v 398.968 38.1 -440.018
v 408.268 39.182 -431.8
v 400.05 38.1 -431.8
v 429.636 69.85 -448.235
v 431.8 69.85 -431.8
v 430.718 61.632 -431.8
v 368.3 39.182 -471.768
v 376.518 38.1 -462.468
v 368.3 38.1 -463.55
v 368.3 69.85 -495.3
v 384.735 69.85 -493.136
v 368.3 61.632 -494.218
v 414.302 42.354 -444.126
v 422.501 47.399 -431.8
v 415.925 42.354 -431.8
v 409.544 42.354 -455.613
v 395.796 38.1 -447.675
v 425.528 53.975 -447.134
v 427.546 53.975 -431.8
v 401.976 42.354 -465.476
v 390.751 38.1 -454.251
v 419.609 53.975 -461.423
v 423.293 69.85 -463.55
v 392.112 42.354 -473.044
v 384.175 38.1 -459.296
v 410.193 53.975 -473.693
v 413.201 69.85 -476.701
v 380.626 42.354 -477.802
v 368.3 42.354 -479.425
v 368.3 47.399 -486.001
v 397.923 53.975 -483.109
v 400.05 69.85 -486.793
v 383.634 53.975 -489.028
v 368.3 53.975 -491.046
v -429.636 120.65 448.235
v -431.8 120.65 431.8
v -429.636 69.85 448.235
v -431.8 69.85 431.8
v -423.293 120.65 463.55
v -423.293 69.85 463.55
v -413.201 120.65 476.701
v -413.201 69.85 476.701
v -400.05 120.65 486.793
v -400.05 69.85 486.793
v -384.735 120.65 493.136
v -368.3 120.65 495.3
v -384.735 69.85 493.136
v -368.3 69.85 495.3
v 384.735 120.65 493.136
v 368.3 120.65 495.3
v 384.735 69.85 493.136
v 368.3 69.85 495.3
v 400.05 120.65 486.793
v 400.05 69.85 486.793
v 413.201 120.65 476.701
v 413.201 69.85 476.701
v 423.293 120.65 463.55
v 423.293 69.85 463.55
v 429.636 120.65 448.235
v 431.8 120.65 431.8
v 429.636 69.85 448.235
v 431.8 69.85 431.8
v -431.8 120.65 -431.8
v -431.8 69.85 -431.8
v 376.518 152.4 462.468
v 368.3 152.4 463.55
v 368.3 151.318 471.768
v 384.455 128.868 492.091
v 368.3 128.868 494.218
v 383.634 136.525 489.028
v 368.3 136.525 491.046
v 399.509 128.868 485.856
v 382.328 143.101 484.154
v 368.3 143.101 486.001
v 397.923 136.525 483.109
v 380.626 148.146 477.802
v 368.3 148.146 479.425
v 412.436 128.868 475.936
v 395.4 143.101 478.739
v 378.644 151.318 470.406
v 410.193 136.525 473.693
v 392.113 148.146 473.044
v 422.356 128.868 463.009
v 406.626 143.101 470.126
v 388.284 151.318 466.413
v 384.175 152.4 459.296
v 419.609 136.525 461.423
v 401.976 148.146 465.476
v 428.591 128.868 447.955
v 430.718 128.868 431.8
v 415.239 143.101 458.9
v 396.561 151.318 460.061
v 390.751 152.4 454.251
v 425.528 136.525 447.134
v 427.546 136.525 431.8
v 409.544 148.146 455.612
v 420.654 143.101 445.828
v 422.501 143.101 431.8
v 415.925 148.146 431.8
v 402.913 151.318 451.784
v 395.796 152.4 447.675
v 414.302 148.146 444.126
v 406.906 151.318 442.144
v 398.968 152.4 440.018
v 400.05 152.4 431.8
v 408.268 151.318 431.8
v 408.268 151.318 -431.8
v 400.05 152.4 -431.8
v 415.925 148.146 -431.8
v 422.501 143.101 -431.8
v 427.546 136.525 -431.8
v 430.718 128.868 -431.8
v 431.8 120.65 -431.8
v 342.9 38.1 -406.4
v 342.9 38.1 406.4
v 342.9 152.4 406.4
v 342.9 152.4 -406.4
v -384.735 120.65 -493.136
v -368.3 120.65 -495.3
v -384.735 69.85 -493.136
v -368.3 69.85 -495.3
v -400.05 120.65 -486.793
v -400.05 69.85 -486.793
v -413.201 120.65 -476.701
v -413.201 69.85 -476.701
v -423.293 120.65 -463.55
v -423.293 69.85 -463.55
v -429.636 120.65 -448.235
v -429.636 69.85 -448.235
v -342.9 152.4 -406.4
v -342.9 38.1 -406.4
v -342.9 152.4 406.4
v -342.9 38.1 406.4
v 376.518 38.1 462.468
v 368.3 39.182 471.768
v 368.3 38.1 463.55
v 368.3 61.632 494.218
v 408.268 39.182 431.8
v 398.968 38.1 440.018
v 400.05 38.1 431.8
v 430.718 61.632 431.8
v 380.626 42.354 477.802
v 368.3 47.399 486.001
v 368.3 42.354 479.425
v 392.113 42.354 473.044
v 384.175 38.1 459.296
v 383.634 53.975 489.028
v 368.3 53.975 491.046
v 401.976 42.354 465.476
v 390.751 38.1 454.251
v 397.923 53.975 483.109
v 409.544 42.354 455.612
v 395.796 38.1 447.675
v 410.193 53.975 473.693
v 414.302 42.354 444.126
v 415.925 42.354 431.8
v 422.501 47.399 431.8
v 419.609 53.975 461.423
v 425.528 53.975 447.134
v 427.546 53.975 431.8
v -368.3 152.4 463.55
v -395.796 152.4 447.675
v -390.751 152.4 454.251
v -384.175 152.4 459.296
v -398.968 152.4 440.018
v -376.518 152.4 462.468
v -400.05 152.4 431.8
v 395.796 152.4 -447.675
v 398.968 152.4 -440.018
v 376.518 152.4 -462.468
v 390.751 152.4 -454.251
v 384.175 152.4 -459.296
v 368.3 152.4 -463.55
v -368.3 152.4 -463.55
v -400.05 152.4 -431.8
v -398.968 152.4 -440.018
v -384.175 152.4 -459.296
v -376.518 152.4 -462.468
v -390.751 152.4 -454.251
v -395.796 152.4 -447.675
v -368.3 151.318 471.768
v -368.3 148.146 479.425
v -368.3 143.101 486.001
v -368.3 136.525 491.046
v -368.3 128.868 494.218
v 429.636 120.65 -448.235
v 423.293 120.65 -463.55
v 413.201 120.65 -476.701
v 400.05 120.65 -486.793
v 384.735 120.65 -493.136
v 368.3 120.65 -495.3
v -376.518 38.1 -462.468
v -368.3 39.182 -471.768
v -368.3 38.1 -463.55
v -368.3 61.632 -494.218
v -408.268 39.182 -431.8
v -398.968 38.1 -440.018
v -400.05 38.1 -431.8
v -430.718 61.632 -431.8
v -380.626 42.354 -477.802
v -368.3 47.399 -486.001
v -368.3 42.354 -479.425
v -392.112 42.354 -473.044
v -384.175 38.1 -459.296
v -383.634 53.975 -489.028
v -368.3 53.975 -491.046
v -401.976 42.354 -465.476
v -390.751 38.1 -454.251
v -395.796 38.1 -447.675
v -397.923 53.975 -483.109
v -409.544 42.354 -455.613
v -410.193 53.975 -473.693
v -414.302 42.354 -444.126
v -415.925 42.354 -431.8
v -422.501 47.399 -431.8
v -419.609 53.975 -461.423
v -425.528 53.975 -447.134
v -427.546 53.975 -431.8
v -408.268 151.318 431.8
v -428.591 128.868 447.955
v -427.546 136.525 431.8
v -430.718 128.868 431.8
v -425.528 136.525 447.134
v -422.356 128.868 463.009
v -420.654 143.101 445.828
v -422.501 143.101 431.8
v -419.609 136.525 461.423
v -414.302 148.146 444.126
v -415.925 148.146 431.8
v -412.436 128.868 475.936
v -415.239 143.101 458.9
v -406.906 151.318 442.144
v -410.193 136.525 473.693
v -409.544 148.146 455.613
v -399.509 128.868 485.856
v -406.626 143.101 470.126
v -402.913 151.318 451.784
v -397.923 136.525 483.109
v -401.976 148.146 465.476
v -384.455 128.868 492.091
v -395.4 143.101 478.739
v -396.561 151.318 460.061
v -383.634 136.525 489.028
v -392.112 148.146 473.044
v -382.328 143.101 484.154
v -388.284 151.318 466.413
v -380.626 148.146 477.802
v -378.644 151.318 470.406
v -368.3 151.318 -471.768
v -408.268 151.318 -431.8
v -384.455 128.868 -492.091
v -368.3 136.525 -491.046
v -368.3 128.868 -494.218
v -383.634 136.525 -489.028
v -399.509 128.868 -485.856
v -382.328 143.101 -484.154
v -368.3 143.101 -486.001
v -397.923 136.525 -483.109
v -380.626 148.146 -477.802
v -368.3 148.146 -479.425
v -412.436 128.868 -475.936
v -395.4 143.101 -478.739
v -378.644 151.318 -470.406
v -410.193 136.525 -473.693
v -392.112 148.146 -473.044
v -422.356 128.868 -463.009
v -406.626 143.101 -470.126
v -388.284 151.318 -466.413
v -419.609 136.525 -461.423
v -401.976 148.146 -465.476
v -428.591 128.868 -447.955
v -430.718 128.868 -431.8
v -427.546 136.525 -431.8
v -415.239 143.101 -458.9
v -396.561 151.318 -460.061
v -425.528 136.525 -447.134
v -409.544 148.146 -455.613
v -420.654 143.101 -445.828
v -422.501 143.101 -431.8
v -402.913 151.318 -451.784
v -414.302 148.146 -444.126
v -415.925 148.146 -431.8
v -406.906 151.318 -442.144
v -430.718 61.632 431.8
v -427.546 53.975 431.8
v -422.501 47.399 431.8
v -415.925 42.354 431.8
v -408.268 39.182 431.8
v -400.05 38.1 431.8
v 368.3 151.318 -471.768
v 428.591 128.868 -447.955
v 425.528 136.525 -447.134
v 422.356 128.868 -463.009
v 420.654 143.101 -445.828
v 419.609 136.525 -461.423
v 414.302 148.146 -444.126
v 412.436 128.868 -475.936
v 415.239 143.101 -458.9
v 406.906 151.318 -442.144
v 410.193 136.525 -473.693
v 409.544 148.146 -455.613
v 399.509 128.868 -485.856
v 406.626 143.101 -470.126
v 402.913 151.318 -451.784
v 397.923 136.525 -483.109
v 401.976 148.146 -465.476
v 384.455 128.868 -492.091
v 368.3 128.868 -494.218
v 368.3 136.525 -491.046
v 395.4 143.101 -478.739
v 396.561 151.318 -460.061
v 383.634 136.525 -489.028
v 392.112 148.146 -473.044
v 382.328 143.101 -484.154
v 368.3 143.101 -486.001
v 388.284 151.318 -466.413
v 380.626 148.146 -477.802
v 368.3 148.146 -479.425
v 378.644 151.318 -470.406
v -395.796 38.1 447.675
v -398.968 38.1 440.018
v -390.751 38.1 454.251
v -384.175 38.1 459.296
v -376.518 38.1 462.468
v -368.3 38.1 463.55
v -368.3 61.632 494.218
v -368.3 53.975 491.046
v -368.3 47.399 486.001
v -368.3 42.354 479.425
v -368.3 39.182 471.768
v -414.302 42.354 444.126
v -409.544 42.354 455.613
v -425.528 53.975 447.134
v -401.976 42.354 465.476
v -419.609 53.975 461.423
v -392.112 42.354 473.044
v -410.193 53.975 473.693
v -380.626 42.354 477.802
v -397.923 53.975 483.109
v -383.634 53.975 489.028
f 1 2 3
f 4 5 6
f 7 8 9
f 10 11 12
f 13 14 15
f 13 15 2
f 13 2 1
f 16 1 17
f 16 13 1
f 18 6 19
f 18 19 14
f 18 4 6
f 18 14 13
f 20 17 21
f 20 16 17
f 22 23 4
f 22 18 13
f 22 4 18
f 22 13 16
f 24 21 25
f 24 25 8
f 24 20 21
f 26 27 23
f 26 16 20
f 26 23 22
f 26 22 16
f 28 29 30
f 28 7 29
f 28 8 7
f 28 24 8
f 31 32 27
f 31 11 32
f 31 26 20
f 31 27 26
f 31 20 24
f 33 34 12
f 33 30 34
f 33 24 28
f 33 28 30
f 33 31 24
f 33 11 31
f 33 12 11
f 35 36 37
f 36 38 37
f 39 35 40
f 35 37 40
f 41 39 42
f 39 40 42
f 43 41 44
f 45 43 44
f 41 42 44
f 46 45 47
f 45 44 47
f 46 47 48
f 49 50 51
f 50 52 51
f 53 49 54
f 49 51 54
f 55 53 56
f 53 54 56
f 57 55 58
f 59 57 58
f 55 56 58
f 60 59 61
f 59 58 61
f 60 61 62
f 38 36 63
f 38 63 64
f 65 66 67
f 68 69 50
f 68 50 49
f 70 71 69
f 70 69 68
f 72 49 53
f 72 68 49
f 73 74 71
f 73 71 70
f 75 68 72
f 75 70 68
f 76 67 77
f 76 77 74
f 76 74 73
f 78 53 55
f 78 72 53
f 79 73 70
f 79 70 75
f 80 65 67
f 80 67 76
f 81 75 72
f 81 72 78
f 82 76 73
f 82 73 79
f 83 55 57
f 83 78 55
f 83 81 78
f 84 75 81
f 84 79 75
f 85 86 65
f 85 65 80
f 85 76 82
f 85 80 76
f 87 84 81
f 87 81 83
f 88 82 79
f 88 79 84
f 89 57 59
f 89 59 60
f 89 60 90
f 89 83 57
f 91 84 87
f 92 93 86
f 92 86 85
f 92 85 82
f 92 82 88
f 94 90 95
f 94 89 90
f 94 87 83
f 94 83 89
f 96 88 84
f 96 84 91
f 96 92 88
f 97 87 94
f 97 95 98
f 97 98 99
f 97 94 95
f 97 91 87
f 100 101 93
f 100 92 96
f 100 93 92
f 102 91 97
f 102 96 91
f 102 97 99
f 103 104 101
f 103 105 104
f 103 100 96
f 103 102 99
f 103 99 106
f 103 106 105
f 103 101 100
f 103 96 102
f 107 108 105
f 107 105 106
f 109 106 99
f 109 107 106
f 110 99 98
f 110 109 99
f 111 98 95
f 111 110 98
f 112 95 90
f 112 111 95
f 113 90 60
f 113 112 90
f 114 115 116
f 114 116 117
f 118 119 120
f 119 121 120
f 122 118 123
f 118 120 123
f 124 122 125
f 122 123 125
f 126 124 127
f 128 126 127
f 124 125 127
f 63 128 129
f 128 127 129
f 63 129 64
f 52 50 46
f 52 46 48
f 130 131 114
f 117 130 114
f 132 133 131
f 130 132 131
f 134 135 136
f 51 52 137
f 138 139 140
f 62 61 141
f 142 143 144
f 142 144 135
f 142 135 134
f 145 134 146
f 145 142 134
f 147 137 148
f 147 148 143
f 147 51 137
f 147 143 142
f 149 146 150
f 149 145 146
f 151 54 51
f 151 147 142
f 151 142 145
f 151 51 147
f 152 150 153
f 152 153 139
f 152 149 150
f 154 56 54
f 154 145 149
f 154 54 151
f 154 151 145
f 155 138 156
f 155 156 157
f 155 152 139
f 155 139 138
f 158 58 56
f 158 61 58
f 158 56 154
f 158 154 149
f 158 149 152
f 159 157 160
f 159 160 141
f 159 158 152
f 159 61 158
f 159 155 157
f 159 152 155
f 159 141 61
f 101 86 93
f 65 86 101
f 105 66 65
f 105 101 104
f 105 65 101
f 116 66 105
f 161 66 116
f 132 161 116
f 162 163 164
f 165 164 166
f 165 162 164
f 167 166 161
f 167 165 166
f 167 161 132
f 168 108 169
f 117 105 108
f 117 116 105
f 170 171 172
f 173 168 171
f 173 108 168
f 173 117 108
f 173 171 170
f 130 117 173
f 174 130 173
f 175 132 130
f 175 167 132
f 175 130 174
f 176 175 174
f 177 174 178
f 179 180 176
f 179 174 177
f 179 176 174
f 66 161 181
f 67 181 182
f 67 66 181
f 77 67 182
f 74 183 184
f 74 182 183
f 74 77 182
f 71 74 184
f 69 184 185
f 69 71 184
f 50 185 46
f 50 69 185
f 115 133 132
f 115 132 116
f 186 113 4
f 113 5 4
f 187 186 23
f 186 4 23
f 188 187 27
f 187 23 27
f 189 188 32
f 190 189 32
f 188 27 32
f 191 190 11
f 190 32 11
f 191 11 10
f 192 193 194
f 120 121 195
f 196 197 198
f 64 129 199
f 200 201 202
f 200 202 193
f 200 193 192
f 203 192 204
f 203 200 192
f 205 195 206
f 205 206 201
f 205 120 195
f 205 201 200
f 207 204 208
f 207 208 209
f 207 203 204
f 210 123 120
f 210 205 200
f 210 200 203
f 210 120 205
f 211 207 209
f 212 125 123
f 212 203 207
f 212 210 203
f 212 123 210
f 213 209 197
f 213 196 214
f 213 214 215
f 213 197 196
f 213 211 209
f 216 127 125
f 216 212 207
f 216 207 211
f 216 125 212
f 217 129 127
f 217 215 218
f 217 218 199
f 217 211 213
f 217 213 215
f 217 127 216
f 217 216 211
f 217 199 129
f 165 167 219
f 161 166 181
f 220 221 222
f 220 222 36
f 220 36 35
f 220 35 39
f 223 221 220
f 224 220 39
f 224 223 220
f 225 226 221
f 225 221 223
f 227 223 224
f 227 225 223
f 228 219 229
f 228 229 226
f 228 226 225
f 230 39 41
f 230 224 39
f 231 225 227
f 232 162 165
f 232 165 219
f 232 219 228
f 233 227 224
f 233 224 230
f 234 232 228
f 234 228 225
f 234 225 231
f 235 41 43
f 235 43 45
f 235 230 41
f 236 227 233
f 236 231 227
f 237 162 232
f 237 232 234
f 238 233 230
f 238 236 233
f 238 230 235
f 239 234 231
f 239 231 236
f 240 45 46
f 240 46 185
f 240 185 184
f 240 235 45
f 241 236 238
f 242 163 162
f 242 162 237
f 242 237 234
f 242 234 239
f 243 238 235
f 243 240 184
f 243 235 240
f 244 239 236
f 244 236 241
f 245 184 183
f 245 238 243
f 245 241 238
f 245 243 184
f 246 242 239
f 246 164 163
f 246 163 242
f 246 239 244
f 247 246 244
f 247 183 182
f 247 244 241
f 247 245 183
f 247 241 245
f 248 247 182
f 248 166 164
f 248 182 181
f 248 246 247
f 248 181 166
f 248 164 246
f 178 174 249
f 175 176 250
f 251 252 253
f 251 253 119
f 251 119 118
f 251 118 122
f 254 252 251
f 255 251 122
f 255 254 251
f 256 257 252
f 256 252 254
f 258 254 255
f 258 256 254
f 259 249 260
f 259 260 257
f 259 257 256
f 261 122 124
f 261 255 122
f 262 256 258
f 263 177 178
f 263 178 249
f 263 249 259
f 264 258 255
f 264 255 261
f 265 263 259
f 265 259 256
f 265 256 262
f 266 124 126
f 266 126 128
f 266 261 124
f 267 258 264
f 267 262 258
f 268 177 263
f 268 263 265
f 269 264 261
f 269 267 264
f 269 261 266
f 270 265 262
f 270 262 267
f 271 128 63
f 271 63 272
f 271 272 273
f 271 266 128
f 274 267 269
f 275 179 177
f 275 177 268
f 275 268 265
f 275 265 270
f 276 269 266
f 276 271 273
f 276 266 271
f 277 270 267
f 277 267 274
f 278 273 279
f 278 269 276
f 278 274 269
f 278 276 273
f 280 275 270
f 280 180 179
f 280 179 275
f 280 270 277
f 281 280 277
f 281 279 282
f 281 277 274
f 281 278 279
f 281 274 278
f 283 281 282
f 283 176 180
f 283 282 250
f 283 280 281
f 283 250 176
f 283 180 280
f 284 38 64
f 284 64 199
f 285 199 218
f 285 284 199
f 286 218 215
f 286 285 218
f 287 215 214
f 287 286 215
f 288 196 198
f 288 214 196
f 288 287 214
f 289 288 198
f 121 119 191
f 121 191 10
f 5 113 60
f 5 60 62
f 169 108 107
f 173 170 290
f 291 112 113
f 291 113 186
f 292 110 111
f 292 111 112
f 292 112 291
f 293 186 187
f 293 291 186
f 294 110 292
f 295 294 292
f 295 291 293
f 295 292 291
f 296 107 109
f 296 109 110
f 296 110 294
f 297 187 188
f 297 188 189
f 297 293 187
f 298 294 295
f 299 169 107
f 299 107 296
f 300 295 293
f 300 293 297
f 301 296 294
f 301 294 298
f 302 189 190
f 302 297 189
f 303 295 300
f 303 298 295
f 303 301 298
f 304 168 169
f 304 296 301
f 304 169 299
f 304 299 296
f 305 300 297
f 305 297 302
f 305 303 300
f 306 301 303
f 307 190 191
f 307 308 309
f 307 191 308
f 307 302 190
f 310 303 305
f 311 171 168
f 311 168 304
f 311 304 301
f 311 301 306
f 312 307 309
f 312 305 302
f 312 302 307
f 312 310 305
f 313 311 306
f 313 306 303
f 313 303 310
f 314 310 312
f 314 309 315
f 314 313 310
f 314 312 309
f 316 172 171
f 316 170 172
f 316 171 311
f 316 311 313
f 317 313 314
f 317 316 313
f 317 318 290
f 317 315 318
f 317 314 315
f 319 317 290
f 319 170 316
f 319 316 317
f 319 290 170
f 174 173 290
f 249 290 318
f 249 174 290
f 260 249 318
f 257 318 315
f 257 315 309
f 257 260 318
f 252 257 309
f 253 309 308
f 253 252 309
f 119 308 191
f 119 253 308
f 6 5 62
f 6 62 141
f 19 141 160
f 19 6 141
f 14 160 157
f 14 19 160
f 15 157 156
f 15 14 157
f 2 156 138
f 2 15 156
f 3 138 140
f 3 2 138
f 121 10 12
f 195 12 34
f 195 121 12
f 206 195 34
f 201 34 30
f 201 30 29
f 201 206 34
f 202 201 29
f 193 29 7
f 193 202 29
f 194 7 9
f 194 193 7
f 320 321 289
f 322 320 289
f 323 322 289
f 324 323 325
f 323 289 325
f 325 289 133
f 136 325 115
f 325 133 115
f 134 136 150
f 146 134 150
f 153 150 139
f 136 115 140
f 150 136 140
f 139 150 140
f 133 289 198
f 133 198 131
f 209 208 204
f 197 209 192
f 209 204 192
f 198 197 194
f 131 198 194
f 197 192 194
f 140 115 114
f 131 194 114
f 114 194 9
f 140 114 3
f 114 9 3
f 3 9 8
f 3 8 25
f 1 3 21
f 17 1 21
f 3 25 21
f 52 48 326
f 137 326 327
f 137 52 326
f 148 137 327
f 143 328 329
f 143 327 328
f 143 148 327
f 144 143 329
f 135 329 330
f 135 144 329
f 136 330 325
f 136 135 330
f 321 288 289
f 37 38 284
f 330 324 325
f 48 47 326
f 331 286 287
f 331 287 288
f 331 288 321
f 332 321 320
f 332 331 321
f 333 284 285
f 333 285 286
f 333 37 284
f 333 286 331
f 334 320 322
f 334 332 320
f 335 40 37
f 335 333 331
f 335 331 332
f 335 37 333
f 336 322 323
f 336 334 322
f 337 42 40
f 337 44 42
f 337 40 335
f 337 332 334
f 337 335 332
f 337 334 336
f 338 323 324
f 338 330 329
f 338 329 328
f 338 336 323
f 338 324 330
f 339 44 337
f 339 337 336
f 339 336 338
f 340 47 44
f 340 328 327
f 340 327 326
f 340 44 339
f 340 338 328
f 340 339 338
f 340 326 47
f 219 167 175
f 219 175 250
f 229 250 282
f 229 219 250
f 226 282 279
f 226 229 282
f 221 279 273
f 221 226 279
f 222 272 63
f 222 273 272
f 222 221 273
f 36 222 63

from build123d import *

# Parameters (mm, degrees)
BOSS_EXTRUDE1_START = 38.1
SKETCH2_W           = 736.6
SKETCH2_H           = 863.6
SKETCH2_W_2         = 685.8
SKETCH2_H_2         = 812.8
BOSS_EXTRUDE1_DEPTH = 114.3


with BuildPart() as part:
    # Sketch2 → Boss-Extrude1 (new body)
    with BuildSketch(Plane(origin=(0, 0, 0), x_dir=(1, 0, 0), z_dir=(0, 1, 0)).offset(BOSS_EXTRUDE1_START)):
        Rectangle(SKETCH2_W, SKETCH2_H)
        Rectangle(SKETCH2_W_2, SKETCH2_H_2, mode=Mode.SUBTRACT)
    extrude(amount=BOSS_EXTRUDE1_DEPTH)

    # Sweep1: sweep along a path in Sketch4
    with BuildLine(Plane(origin=(0, 152.4, 0), x_dir=(1, 0, 0), z_dir=(0, 1, 0))) as sweep1_path:
        Line((368.3, 495.3), (-368.3, 495.3))
        ThreePointArc((-368.3, 495.3), (-413.201280605, 476.701280605), (-431.8, 431.8))
        Line((-431.8, 431.8), (-431.8, -431.8))
        ThreePointArc((-431.8, -431.8), (-413.201280605, -476.701280605), (-368.3, -495.3))
        Line((-368.3, -495.3), (368.3, -495.3))
        ThreePointArc((368.3, -495.3), (413.201280605, -476.701280605), (431.8, -431.8))
        Line((431.8, -431.8), (431.8, 431.8))
        ThreePointArc((431.8, 431.8), (413.201280605, 476.701280605), (368.3, 495.3))
    # Sketch3 → Sweep1 (sweep)
    with BuildSketch(Plane.XY.offset(431.8)):
        with BuildLine():
            Line((-400.05, 152.4), (-368.3, 152.4))
            Line((-368.3, 152.4), (-368.3, 38.1))
            Line((-368.3, 38.1), (-400.05, 38.1))
            ThreePointArc((-400.05, 38.1), (-422.500640303, 47.399359697), (-431.8, 69.85))
            Line((-431.8, 69.85), (-431.8, 120.65))
            ThreePointArc((-431.8, 120.65), (-422.500640303, 143.100640303), (-400.05, 152.4))
        make_face()
    sweep(path=sweep1_path.line)


solid = part.part
